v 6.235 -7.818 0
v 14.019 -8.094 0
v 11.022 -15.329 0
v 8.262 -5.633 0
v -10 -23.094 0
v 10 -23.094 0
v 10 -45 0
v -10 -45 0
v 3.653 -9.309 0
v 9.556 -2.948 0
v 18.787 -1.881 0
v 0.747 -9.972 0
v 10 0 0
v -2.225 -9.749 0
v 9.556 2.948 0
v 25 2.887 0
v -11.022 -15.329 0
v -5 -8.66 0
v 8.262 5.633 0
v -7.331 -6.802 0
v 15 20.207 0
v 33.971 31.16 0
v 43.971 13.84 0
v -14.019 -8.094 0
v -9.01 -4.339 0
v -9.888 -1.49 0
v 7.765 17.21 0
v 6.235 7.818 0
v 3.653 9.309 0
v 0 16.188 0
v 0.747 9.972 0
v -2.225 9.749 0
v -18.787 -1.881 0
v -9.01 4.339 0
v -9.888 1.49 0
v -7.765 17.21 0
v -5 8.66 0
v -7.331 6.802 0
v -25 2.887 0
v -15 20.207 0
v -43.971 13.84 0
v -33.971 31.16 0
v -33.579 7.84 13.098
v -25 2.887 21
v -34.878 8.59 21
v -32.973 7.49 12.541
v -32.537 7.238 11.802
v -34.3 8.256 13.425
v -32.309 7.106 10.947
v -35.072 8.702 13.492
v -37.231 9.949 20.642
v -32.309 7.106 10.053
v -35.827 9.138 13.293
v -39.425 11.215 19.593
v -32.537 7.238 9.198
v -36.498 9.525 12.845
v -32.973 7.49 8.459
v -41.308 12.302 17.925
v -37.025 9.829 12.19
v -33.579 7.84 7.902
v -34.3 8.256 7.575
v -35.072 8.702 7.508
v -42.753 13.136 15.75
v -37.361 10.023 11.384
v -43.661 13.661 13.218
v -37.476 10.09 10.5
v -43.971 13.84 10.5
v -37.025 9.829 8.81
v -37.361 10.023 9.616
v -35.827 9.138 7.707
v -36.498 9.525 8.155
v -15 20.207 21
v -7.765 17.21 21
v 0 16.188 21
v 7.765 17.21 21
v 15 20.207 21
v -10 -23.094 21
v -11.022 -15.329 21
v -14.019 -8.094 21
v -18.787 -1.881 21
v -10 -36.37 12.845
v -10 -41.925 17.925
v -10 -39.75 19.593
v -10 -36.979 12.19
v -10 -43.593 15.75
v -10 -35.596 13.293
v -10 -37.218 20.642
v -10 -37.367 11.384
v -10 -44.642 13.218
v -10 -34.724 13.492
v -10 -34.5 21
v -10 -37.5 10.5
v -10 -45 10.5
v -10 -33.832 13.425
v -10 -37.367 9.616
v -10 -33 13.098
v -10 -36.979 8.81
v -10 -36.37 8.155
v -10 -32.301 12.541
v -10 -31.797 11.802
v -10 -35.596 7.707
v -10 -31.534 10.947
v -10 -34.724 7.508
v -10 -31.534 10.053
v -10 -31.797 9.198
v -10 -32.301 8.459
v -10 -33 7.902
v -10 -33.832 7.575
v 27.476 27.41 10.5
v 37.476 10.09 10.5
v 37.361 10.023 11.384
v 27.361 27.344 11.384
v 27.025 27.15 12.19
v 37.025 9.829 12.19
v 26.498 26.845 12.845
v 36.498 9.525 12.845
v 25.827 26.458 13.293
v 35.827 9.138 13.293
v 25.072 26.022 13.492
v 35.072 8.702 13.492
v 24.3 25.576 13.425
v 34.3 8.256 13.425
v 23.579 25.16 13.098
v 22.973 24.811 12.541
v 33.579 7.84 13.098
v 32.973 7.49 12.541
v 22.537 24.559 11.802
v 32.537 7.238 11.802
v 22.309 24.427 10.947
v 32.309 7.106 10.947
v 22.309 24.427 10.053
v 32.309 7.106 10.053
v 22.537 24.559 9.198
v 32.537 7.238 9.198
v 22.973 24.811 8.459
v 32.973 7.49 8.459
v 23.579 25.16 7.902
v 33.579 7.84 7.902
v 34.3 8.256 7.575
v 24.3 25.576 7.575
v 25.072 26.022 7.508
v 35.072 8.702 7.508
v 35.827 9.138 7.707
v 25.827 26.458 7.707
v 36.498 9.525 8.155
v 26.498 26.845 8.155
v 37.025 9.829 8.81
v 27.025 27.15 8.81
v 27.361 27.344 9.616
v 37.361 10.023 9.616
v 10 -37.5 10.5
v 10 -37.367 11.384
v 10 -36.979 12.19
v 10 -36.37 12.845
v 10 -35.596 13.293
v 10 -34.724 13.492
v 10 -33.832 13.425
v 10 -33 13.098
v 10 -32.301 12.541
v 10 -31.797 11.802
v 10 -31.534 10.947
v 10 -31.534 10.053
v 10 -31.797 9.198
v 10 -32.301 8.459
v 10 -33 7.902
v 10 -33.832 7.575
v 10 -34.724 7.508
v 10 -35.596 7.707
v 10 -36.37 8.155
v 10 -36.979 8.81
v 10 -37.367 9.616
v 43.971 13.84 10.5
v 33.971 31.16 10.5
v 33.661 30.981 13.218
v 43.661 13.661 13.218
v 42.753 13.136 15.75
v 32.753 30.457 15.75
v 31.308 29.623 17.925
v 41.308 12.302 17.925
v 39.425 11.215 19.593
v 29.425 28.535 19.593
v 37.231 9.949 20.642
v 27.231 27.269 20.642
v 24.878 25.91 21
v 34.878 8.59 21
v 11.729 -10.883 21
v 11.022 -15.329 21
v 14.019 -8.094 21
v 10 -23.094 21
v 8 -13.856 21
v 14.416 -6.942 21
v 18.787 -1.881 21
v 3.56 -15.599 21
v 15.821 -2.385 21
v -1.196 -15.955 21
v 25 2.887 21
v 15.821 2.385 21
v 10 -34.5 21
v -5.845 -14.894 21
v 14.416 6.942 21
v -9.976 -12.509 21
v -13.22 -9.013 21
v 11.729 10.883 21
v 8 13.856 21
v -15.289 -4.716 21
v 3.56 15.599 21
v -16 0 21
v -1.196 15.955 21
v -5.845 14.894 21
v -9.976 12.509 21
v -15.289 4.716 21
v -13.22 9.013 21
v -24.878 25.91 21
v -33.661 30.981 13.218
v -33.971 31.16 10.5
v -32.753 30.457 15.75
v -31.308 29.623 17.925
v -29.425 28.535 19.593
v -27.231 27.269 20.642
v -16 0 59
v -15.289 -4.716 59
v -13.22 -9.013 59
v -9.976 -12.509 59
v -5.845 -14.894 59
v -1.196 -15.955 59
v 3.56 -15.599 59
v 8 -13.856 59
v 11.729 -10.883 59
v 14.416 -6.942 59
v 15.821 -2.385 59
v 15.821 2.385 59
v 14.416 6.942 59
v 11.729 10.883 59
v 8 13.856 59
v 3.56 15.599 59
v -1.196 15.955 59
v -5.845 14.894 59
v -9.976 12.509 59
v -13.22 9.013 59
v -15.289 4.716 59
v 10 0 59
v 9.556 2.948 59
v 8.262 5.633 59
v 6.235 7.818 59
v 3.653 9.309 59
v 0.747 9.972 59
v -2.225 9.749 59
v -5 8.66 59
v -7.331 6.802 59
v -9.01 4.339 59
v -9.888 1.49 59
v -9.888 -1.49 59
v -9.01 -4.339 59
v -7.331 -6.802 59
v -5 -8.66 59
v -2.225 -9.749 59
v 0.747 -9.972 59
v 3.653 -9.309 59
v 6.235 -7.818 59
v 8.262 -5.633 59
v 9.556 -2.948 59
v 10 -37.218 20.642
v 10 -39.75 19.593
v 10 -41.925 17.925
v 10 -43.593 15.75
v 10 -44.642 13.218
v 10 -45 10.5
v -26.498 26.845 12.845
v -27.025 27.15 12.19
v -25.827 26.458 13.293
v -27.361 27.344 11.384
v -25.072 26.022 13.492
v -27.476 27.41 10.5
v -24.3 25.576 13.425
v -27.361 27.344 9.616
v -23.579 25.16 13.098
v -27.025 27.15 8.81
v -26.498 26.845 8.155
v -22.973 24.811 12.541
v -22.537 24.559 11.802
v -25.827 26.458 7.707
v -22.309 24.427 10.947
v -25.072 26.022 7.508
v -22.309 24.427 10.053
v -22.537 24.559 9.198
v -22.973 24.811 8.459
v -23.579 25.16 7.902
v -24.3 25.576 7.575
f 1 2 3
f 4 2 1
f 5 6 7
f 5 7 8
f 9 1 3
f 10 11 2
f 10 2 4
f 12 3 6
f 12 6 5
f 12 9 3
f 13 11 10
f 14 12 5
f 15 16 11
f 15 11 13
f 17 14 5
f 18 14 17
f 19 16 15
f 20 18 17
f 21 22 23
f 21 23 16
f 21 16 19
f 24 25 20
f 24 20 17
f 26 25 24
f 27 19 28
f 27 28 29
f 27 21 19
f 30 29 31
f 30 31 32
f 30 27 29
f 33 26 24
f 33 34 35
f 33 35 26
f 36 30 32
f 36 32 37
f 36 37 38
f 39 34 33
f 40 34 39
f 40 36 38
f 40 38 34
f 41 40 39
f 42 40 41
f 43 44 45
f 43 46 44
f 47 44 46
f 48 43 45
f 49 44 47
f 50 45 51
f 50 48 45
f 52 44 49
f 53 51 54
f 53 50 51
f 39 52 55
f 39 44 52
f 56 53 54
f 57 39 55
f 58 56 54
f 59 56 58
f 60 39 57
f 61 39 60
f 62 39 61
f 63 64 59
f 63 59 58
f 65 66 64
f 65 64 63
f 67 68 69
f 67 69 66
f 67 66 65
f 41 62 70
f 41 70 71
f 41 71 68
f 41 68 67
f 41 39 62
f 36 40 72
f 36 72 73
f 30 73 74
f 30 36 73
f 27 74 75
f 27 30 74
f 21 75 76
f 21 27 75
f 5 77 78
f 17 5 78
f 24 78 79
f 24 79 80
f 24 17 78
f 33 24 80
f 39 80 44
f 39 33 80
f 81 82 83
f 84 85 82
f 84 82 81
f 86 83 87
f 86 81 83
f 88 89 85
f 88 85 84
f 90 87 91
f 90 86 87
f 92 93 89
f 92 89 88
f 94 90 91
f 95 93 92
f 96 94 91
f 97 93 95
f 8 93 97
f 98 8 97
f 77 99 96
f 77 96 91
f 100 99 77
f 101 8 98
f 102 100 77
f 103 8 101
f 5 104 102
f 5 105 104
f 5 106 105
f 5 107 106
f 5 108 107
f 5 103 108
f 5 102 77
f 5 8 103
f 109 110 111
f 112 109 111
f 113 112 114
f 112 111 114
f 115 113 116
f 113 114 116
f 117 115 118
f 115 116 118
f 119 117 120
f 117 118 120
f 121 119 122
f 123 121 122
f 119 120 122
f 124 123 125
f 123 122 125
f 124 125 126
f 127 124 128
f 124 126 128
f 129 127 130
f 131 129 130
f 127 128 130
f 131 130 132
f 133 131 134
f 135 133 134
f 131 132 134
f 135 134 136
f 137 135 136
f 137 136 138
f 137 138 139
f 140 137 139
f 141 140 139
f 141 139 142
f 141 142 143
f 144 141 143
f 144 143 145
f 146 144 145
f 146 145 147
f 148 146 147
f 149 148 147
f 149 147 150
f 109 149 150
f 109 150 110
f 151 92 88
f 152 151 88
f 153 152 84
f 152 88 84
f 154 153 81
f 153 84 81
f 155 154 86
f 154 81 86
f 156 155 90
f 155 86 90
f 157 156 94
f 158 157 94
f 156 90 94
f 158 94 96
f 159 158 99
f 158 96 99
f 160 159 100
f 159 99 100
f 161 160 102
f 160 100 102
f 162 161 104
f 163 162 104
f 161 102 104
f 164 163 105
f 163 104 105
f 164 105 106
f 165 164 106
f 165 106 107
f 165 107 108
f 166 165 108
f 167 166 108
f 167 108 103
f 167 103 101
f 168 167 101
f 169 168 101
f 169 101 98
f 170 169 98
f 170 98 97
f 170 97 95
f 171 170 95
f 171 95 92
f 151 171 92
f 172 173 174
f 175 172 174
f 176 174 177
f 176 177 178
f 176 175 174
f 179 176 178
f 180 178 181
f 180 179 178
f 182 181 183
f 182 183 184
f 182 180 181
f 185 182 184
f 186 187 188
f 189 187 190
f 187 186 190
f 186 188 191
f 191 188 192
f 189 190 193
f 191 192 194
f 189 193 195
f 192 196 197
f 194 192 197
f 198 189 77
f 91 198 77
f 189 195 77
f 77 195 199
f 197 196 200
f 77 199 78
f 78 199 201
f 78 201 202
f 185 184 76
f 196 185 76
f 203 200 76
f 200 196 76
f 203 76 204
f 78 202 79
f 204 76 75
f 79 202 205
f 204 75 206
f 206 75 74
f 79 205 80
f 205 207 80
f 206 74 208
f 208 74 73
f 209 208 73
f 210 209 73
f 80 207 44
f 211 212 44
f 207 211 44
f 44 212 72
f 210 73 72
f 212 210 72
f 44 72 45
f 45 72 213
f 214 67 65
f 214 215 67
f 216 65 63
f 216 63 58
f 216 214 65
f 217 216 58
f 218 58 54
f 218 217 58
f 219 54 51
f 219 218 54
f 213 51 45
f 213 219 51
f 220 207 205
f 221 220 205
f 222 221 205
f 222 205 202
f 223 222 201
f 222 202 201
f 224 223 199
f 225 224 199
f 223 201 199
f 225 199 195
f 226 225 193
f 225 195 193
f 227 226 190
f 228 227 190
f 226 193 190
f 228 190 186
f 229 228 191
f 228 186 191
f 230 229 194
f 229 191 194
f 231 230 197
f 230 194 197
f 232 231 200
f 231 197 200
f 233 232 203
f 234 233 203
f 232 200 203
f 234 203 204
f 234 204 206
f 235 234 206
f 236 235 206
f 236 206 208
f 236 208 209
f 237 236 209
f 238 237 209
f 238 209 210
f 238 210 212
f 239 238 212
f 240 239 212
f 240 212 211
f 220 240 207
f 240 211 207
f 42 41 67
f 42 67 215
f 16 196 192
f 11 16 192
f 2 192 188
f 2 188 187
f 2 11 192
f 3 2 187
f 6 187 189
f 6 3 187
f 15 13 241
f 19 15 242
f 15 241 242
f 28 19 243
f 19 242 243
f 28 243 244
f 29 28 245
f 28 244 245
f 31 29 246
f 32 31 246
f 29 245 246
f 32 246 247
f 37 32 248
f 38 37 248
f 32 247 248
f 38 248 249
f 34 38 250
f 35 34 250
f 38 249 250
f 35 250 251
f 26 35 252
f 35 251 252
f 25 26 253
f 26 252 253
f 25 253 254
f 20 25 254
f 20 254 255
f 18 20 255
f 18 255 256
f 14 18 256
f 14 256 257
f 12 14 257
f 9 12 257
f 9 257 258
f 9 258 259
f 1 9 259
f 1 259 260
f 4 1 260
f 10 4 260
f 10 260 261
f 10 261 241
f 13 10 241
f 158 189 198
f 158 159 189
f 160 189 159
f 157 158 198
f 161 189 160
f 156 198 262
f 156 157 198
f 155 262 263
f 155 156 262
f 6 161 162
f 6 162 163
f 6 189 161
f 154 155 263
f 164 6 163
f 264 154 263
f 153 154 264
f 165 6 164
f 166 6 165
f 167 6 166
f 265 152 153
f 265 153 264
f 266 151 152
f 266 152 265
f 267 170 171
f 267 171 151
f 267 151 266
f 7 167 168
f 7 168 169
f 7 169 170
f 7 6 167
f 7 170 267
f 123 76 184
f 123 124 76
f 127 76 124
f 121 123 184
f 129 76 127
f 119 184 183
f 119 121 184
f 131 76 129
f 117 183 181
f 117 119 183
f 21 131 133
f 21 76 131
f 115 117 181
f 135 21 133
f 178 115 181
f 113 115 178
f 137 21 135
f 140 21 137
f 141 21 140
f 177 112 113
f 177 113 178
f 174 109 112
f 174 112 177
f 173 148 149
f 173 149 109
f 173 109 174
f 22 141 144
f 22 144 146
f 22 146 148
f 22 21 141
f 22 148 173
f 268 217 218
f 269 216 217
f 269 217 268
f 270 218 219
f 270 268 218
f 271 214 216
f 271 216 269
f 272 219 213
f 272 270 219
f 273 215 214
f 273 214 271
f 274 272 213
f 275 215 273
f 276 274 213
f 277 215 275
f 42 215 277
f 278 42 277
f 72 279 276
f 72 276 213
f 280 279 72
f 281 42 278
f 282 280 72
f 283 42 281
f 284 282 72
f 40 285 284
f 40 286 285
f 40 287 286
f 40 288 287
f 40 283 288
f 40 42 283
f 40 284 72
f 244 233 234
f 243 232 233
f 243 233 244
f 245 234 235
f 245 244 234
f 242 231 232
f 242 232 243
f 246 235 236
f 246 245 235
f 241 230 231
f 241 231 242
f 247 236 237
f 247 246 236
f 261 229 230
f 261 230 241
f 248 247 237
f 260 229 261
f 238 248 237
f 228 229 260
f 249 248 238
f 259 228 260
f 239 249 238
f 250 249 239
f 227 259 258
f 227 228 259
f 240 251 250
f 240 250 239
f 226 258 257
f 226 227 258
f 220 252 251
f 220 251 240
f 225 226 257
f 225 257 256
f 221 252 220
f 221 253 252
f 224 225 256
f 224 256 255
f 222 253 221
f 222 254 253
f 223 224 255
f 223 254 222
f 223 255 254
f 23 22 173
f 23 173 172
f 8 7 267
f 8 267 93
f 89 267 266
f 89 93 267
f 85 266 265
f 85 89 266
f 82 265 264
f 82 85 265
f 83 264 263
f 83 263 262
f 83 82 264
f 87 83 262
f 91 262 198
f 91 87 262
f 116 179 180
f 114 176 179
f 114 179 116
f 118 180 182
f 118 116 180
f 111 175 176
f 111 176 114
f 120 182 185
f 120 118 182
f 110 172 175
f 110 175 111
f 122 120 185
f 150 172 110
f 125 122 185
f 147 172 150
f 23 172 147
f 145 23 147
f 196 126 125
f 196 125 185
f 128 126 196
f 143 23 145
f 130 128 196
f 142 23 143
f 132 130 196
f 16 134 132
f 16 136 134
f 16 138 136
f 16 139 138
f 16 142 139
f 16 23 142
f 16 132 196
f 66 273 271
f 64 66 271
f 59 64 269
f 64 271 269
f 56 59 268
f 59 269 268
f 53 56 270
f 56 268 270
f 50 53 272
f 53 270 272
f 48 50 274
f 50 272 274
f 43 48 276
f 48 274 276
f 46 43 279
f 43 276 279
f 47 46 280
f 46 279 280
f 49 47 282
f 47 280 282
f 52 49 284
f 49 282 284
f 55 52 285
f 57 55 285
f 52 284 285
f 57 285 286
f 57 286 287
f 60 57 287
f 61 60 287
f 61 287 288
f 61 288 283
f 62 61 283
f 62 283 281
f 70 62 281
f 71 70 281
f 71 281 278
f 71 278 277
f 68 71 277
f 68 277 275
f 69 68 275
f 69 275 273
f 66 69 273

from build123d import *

# Parameters (mm, degrees)
SALIENTE_EXTRUIR1_DEPTH = 21
REDONDEO1_R             = 10.5
CROQUIS2_R              = 16
SALIENTE_EXTRUIR2_DEPTH = 38
CROQUIS3_R              = 10
CORTAR_EXTRUIR1_DEPTH   = 74
CROQUIS4_R              = 3
CORTAR_EXTRUIR2_DEPTH   = 25
MATRIZC1_COUNT          = 3


with BuildPart() as part:
    # Croquis1 → Saliente-Extruir1 (new body)
    with BuildSketch(Plane.XY):
        with BuildLine():
            Line((15, 20.207259422), (33.97114317, 31.160254038))
            Line((33.97114317, 31.160254038), (43.97114317, 13.839745962))
            Line((43.97114317, 13.839745962), (25, 2.886751346))
            ThreePointArc((25, 2.886751346), (14.019237886, -8.094010768), (10, -23.094010768))
            Line((10, -23.094010768), (10, -45))
            Line((10, -45), (-10, -45))
            Line((-10, -45), (-10, -23.094010768))
            ThreePointArc((-10, -23.094010768), (-14.019237886, -8.094010768), (-25, 2.886751346))
            Line((-25, 2.886751346), (-43.97114317, 13.839745962))
            Line((-43.97114317, 13.839745962), (-33.97114317, 31.160254038))
            Line((-33.97114317, 31.160254038), (-15, 20.207259422))
            ThreePointArc((-15, 20.207259422), (0, 16.188021535), (15, 20.207259422))
        make_face()
    extrude(amount=SALIENTE_EXTRUIR1_DEPTH)

    # Redondeo1
    redondeo1_edges = [part.edges().sort_by_distance(p)[0] for p in [
        (38.97114317, 22.5, 21),
        (-38.97114317, 22.5, 21),
        (0, -45, 21),
    ]]
    fillet(redondeo1_edges, radius=REDONDEO1_R)

    # Croquis2 → Saliente-Extruir2 (add)
    with BuildSketch(Plane.XY.offset(21)):
        with Locations(Location((0, 0, 0), (0, 0, 180))):
            Circle(CROQUIS2_R)
    extrude(amount=SALIENTE_EXTRUIR2_DEPTH)

    # Croquis3 → Cortar-Extruir1 (cut)
    with BuildSketch(Plane.XY.offset(59)):
        Circle(CROQUIS3_R)
    extrude(amount=-CORTAR_EXTRUIR1_DEPTH, mode=Mode.SUBTRACT)

    # Croquis4 → Cortar-Extruir2 (cut)
    with BuildSketch(Plane(origin=(5, 8.660254038, 0), x_dir=(0.866025403784439, -0.4999999999999993, 0), z_dir=(0.4999999999999993, 0.866025403784439, 0))):
        with Locations(Location((-34.5, -10.5, 0), (0, 0, 180))):
            Circle(CROQUIS4_R)
    cortar_extruir2 = extrude(amount=-CORTAR_EXTRUIR2_DEPTH, mode=Mode.SUBTRACT)

    # MatrizC1: Cortar-Extruir2 ×3 about axis
    matrizc1_axis = Axis((0, 0, 59), (0, 0, -1))
    for i in range(1, MATRIZC1_COUNT):
        add(cortar_extruir2.rotate(matrizc1_axis, i * 360 / MATRIZC1_COUNT), mode=Mode.SUBTRACT)


solid = part.part
